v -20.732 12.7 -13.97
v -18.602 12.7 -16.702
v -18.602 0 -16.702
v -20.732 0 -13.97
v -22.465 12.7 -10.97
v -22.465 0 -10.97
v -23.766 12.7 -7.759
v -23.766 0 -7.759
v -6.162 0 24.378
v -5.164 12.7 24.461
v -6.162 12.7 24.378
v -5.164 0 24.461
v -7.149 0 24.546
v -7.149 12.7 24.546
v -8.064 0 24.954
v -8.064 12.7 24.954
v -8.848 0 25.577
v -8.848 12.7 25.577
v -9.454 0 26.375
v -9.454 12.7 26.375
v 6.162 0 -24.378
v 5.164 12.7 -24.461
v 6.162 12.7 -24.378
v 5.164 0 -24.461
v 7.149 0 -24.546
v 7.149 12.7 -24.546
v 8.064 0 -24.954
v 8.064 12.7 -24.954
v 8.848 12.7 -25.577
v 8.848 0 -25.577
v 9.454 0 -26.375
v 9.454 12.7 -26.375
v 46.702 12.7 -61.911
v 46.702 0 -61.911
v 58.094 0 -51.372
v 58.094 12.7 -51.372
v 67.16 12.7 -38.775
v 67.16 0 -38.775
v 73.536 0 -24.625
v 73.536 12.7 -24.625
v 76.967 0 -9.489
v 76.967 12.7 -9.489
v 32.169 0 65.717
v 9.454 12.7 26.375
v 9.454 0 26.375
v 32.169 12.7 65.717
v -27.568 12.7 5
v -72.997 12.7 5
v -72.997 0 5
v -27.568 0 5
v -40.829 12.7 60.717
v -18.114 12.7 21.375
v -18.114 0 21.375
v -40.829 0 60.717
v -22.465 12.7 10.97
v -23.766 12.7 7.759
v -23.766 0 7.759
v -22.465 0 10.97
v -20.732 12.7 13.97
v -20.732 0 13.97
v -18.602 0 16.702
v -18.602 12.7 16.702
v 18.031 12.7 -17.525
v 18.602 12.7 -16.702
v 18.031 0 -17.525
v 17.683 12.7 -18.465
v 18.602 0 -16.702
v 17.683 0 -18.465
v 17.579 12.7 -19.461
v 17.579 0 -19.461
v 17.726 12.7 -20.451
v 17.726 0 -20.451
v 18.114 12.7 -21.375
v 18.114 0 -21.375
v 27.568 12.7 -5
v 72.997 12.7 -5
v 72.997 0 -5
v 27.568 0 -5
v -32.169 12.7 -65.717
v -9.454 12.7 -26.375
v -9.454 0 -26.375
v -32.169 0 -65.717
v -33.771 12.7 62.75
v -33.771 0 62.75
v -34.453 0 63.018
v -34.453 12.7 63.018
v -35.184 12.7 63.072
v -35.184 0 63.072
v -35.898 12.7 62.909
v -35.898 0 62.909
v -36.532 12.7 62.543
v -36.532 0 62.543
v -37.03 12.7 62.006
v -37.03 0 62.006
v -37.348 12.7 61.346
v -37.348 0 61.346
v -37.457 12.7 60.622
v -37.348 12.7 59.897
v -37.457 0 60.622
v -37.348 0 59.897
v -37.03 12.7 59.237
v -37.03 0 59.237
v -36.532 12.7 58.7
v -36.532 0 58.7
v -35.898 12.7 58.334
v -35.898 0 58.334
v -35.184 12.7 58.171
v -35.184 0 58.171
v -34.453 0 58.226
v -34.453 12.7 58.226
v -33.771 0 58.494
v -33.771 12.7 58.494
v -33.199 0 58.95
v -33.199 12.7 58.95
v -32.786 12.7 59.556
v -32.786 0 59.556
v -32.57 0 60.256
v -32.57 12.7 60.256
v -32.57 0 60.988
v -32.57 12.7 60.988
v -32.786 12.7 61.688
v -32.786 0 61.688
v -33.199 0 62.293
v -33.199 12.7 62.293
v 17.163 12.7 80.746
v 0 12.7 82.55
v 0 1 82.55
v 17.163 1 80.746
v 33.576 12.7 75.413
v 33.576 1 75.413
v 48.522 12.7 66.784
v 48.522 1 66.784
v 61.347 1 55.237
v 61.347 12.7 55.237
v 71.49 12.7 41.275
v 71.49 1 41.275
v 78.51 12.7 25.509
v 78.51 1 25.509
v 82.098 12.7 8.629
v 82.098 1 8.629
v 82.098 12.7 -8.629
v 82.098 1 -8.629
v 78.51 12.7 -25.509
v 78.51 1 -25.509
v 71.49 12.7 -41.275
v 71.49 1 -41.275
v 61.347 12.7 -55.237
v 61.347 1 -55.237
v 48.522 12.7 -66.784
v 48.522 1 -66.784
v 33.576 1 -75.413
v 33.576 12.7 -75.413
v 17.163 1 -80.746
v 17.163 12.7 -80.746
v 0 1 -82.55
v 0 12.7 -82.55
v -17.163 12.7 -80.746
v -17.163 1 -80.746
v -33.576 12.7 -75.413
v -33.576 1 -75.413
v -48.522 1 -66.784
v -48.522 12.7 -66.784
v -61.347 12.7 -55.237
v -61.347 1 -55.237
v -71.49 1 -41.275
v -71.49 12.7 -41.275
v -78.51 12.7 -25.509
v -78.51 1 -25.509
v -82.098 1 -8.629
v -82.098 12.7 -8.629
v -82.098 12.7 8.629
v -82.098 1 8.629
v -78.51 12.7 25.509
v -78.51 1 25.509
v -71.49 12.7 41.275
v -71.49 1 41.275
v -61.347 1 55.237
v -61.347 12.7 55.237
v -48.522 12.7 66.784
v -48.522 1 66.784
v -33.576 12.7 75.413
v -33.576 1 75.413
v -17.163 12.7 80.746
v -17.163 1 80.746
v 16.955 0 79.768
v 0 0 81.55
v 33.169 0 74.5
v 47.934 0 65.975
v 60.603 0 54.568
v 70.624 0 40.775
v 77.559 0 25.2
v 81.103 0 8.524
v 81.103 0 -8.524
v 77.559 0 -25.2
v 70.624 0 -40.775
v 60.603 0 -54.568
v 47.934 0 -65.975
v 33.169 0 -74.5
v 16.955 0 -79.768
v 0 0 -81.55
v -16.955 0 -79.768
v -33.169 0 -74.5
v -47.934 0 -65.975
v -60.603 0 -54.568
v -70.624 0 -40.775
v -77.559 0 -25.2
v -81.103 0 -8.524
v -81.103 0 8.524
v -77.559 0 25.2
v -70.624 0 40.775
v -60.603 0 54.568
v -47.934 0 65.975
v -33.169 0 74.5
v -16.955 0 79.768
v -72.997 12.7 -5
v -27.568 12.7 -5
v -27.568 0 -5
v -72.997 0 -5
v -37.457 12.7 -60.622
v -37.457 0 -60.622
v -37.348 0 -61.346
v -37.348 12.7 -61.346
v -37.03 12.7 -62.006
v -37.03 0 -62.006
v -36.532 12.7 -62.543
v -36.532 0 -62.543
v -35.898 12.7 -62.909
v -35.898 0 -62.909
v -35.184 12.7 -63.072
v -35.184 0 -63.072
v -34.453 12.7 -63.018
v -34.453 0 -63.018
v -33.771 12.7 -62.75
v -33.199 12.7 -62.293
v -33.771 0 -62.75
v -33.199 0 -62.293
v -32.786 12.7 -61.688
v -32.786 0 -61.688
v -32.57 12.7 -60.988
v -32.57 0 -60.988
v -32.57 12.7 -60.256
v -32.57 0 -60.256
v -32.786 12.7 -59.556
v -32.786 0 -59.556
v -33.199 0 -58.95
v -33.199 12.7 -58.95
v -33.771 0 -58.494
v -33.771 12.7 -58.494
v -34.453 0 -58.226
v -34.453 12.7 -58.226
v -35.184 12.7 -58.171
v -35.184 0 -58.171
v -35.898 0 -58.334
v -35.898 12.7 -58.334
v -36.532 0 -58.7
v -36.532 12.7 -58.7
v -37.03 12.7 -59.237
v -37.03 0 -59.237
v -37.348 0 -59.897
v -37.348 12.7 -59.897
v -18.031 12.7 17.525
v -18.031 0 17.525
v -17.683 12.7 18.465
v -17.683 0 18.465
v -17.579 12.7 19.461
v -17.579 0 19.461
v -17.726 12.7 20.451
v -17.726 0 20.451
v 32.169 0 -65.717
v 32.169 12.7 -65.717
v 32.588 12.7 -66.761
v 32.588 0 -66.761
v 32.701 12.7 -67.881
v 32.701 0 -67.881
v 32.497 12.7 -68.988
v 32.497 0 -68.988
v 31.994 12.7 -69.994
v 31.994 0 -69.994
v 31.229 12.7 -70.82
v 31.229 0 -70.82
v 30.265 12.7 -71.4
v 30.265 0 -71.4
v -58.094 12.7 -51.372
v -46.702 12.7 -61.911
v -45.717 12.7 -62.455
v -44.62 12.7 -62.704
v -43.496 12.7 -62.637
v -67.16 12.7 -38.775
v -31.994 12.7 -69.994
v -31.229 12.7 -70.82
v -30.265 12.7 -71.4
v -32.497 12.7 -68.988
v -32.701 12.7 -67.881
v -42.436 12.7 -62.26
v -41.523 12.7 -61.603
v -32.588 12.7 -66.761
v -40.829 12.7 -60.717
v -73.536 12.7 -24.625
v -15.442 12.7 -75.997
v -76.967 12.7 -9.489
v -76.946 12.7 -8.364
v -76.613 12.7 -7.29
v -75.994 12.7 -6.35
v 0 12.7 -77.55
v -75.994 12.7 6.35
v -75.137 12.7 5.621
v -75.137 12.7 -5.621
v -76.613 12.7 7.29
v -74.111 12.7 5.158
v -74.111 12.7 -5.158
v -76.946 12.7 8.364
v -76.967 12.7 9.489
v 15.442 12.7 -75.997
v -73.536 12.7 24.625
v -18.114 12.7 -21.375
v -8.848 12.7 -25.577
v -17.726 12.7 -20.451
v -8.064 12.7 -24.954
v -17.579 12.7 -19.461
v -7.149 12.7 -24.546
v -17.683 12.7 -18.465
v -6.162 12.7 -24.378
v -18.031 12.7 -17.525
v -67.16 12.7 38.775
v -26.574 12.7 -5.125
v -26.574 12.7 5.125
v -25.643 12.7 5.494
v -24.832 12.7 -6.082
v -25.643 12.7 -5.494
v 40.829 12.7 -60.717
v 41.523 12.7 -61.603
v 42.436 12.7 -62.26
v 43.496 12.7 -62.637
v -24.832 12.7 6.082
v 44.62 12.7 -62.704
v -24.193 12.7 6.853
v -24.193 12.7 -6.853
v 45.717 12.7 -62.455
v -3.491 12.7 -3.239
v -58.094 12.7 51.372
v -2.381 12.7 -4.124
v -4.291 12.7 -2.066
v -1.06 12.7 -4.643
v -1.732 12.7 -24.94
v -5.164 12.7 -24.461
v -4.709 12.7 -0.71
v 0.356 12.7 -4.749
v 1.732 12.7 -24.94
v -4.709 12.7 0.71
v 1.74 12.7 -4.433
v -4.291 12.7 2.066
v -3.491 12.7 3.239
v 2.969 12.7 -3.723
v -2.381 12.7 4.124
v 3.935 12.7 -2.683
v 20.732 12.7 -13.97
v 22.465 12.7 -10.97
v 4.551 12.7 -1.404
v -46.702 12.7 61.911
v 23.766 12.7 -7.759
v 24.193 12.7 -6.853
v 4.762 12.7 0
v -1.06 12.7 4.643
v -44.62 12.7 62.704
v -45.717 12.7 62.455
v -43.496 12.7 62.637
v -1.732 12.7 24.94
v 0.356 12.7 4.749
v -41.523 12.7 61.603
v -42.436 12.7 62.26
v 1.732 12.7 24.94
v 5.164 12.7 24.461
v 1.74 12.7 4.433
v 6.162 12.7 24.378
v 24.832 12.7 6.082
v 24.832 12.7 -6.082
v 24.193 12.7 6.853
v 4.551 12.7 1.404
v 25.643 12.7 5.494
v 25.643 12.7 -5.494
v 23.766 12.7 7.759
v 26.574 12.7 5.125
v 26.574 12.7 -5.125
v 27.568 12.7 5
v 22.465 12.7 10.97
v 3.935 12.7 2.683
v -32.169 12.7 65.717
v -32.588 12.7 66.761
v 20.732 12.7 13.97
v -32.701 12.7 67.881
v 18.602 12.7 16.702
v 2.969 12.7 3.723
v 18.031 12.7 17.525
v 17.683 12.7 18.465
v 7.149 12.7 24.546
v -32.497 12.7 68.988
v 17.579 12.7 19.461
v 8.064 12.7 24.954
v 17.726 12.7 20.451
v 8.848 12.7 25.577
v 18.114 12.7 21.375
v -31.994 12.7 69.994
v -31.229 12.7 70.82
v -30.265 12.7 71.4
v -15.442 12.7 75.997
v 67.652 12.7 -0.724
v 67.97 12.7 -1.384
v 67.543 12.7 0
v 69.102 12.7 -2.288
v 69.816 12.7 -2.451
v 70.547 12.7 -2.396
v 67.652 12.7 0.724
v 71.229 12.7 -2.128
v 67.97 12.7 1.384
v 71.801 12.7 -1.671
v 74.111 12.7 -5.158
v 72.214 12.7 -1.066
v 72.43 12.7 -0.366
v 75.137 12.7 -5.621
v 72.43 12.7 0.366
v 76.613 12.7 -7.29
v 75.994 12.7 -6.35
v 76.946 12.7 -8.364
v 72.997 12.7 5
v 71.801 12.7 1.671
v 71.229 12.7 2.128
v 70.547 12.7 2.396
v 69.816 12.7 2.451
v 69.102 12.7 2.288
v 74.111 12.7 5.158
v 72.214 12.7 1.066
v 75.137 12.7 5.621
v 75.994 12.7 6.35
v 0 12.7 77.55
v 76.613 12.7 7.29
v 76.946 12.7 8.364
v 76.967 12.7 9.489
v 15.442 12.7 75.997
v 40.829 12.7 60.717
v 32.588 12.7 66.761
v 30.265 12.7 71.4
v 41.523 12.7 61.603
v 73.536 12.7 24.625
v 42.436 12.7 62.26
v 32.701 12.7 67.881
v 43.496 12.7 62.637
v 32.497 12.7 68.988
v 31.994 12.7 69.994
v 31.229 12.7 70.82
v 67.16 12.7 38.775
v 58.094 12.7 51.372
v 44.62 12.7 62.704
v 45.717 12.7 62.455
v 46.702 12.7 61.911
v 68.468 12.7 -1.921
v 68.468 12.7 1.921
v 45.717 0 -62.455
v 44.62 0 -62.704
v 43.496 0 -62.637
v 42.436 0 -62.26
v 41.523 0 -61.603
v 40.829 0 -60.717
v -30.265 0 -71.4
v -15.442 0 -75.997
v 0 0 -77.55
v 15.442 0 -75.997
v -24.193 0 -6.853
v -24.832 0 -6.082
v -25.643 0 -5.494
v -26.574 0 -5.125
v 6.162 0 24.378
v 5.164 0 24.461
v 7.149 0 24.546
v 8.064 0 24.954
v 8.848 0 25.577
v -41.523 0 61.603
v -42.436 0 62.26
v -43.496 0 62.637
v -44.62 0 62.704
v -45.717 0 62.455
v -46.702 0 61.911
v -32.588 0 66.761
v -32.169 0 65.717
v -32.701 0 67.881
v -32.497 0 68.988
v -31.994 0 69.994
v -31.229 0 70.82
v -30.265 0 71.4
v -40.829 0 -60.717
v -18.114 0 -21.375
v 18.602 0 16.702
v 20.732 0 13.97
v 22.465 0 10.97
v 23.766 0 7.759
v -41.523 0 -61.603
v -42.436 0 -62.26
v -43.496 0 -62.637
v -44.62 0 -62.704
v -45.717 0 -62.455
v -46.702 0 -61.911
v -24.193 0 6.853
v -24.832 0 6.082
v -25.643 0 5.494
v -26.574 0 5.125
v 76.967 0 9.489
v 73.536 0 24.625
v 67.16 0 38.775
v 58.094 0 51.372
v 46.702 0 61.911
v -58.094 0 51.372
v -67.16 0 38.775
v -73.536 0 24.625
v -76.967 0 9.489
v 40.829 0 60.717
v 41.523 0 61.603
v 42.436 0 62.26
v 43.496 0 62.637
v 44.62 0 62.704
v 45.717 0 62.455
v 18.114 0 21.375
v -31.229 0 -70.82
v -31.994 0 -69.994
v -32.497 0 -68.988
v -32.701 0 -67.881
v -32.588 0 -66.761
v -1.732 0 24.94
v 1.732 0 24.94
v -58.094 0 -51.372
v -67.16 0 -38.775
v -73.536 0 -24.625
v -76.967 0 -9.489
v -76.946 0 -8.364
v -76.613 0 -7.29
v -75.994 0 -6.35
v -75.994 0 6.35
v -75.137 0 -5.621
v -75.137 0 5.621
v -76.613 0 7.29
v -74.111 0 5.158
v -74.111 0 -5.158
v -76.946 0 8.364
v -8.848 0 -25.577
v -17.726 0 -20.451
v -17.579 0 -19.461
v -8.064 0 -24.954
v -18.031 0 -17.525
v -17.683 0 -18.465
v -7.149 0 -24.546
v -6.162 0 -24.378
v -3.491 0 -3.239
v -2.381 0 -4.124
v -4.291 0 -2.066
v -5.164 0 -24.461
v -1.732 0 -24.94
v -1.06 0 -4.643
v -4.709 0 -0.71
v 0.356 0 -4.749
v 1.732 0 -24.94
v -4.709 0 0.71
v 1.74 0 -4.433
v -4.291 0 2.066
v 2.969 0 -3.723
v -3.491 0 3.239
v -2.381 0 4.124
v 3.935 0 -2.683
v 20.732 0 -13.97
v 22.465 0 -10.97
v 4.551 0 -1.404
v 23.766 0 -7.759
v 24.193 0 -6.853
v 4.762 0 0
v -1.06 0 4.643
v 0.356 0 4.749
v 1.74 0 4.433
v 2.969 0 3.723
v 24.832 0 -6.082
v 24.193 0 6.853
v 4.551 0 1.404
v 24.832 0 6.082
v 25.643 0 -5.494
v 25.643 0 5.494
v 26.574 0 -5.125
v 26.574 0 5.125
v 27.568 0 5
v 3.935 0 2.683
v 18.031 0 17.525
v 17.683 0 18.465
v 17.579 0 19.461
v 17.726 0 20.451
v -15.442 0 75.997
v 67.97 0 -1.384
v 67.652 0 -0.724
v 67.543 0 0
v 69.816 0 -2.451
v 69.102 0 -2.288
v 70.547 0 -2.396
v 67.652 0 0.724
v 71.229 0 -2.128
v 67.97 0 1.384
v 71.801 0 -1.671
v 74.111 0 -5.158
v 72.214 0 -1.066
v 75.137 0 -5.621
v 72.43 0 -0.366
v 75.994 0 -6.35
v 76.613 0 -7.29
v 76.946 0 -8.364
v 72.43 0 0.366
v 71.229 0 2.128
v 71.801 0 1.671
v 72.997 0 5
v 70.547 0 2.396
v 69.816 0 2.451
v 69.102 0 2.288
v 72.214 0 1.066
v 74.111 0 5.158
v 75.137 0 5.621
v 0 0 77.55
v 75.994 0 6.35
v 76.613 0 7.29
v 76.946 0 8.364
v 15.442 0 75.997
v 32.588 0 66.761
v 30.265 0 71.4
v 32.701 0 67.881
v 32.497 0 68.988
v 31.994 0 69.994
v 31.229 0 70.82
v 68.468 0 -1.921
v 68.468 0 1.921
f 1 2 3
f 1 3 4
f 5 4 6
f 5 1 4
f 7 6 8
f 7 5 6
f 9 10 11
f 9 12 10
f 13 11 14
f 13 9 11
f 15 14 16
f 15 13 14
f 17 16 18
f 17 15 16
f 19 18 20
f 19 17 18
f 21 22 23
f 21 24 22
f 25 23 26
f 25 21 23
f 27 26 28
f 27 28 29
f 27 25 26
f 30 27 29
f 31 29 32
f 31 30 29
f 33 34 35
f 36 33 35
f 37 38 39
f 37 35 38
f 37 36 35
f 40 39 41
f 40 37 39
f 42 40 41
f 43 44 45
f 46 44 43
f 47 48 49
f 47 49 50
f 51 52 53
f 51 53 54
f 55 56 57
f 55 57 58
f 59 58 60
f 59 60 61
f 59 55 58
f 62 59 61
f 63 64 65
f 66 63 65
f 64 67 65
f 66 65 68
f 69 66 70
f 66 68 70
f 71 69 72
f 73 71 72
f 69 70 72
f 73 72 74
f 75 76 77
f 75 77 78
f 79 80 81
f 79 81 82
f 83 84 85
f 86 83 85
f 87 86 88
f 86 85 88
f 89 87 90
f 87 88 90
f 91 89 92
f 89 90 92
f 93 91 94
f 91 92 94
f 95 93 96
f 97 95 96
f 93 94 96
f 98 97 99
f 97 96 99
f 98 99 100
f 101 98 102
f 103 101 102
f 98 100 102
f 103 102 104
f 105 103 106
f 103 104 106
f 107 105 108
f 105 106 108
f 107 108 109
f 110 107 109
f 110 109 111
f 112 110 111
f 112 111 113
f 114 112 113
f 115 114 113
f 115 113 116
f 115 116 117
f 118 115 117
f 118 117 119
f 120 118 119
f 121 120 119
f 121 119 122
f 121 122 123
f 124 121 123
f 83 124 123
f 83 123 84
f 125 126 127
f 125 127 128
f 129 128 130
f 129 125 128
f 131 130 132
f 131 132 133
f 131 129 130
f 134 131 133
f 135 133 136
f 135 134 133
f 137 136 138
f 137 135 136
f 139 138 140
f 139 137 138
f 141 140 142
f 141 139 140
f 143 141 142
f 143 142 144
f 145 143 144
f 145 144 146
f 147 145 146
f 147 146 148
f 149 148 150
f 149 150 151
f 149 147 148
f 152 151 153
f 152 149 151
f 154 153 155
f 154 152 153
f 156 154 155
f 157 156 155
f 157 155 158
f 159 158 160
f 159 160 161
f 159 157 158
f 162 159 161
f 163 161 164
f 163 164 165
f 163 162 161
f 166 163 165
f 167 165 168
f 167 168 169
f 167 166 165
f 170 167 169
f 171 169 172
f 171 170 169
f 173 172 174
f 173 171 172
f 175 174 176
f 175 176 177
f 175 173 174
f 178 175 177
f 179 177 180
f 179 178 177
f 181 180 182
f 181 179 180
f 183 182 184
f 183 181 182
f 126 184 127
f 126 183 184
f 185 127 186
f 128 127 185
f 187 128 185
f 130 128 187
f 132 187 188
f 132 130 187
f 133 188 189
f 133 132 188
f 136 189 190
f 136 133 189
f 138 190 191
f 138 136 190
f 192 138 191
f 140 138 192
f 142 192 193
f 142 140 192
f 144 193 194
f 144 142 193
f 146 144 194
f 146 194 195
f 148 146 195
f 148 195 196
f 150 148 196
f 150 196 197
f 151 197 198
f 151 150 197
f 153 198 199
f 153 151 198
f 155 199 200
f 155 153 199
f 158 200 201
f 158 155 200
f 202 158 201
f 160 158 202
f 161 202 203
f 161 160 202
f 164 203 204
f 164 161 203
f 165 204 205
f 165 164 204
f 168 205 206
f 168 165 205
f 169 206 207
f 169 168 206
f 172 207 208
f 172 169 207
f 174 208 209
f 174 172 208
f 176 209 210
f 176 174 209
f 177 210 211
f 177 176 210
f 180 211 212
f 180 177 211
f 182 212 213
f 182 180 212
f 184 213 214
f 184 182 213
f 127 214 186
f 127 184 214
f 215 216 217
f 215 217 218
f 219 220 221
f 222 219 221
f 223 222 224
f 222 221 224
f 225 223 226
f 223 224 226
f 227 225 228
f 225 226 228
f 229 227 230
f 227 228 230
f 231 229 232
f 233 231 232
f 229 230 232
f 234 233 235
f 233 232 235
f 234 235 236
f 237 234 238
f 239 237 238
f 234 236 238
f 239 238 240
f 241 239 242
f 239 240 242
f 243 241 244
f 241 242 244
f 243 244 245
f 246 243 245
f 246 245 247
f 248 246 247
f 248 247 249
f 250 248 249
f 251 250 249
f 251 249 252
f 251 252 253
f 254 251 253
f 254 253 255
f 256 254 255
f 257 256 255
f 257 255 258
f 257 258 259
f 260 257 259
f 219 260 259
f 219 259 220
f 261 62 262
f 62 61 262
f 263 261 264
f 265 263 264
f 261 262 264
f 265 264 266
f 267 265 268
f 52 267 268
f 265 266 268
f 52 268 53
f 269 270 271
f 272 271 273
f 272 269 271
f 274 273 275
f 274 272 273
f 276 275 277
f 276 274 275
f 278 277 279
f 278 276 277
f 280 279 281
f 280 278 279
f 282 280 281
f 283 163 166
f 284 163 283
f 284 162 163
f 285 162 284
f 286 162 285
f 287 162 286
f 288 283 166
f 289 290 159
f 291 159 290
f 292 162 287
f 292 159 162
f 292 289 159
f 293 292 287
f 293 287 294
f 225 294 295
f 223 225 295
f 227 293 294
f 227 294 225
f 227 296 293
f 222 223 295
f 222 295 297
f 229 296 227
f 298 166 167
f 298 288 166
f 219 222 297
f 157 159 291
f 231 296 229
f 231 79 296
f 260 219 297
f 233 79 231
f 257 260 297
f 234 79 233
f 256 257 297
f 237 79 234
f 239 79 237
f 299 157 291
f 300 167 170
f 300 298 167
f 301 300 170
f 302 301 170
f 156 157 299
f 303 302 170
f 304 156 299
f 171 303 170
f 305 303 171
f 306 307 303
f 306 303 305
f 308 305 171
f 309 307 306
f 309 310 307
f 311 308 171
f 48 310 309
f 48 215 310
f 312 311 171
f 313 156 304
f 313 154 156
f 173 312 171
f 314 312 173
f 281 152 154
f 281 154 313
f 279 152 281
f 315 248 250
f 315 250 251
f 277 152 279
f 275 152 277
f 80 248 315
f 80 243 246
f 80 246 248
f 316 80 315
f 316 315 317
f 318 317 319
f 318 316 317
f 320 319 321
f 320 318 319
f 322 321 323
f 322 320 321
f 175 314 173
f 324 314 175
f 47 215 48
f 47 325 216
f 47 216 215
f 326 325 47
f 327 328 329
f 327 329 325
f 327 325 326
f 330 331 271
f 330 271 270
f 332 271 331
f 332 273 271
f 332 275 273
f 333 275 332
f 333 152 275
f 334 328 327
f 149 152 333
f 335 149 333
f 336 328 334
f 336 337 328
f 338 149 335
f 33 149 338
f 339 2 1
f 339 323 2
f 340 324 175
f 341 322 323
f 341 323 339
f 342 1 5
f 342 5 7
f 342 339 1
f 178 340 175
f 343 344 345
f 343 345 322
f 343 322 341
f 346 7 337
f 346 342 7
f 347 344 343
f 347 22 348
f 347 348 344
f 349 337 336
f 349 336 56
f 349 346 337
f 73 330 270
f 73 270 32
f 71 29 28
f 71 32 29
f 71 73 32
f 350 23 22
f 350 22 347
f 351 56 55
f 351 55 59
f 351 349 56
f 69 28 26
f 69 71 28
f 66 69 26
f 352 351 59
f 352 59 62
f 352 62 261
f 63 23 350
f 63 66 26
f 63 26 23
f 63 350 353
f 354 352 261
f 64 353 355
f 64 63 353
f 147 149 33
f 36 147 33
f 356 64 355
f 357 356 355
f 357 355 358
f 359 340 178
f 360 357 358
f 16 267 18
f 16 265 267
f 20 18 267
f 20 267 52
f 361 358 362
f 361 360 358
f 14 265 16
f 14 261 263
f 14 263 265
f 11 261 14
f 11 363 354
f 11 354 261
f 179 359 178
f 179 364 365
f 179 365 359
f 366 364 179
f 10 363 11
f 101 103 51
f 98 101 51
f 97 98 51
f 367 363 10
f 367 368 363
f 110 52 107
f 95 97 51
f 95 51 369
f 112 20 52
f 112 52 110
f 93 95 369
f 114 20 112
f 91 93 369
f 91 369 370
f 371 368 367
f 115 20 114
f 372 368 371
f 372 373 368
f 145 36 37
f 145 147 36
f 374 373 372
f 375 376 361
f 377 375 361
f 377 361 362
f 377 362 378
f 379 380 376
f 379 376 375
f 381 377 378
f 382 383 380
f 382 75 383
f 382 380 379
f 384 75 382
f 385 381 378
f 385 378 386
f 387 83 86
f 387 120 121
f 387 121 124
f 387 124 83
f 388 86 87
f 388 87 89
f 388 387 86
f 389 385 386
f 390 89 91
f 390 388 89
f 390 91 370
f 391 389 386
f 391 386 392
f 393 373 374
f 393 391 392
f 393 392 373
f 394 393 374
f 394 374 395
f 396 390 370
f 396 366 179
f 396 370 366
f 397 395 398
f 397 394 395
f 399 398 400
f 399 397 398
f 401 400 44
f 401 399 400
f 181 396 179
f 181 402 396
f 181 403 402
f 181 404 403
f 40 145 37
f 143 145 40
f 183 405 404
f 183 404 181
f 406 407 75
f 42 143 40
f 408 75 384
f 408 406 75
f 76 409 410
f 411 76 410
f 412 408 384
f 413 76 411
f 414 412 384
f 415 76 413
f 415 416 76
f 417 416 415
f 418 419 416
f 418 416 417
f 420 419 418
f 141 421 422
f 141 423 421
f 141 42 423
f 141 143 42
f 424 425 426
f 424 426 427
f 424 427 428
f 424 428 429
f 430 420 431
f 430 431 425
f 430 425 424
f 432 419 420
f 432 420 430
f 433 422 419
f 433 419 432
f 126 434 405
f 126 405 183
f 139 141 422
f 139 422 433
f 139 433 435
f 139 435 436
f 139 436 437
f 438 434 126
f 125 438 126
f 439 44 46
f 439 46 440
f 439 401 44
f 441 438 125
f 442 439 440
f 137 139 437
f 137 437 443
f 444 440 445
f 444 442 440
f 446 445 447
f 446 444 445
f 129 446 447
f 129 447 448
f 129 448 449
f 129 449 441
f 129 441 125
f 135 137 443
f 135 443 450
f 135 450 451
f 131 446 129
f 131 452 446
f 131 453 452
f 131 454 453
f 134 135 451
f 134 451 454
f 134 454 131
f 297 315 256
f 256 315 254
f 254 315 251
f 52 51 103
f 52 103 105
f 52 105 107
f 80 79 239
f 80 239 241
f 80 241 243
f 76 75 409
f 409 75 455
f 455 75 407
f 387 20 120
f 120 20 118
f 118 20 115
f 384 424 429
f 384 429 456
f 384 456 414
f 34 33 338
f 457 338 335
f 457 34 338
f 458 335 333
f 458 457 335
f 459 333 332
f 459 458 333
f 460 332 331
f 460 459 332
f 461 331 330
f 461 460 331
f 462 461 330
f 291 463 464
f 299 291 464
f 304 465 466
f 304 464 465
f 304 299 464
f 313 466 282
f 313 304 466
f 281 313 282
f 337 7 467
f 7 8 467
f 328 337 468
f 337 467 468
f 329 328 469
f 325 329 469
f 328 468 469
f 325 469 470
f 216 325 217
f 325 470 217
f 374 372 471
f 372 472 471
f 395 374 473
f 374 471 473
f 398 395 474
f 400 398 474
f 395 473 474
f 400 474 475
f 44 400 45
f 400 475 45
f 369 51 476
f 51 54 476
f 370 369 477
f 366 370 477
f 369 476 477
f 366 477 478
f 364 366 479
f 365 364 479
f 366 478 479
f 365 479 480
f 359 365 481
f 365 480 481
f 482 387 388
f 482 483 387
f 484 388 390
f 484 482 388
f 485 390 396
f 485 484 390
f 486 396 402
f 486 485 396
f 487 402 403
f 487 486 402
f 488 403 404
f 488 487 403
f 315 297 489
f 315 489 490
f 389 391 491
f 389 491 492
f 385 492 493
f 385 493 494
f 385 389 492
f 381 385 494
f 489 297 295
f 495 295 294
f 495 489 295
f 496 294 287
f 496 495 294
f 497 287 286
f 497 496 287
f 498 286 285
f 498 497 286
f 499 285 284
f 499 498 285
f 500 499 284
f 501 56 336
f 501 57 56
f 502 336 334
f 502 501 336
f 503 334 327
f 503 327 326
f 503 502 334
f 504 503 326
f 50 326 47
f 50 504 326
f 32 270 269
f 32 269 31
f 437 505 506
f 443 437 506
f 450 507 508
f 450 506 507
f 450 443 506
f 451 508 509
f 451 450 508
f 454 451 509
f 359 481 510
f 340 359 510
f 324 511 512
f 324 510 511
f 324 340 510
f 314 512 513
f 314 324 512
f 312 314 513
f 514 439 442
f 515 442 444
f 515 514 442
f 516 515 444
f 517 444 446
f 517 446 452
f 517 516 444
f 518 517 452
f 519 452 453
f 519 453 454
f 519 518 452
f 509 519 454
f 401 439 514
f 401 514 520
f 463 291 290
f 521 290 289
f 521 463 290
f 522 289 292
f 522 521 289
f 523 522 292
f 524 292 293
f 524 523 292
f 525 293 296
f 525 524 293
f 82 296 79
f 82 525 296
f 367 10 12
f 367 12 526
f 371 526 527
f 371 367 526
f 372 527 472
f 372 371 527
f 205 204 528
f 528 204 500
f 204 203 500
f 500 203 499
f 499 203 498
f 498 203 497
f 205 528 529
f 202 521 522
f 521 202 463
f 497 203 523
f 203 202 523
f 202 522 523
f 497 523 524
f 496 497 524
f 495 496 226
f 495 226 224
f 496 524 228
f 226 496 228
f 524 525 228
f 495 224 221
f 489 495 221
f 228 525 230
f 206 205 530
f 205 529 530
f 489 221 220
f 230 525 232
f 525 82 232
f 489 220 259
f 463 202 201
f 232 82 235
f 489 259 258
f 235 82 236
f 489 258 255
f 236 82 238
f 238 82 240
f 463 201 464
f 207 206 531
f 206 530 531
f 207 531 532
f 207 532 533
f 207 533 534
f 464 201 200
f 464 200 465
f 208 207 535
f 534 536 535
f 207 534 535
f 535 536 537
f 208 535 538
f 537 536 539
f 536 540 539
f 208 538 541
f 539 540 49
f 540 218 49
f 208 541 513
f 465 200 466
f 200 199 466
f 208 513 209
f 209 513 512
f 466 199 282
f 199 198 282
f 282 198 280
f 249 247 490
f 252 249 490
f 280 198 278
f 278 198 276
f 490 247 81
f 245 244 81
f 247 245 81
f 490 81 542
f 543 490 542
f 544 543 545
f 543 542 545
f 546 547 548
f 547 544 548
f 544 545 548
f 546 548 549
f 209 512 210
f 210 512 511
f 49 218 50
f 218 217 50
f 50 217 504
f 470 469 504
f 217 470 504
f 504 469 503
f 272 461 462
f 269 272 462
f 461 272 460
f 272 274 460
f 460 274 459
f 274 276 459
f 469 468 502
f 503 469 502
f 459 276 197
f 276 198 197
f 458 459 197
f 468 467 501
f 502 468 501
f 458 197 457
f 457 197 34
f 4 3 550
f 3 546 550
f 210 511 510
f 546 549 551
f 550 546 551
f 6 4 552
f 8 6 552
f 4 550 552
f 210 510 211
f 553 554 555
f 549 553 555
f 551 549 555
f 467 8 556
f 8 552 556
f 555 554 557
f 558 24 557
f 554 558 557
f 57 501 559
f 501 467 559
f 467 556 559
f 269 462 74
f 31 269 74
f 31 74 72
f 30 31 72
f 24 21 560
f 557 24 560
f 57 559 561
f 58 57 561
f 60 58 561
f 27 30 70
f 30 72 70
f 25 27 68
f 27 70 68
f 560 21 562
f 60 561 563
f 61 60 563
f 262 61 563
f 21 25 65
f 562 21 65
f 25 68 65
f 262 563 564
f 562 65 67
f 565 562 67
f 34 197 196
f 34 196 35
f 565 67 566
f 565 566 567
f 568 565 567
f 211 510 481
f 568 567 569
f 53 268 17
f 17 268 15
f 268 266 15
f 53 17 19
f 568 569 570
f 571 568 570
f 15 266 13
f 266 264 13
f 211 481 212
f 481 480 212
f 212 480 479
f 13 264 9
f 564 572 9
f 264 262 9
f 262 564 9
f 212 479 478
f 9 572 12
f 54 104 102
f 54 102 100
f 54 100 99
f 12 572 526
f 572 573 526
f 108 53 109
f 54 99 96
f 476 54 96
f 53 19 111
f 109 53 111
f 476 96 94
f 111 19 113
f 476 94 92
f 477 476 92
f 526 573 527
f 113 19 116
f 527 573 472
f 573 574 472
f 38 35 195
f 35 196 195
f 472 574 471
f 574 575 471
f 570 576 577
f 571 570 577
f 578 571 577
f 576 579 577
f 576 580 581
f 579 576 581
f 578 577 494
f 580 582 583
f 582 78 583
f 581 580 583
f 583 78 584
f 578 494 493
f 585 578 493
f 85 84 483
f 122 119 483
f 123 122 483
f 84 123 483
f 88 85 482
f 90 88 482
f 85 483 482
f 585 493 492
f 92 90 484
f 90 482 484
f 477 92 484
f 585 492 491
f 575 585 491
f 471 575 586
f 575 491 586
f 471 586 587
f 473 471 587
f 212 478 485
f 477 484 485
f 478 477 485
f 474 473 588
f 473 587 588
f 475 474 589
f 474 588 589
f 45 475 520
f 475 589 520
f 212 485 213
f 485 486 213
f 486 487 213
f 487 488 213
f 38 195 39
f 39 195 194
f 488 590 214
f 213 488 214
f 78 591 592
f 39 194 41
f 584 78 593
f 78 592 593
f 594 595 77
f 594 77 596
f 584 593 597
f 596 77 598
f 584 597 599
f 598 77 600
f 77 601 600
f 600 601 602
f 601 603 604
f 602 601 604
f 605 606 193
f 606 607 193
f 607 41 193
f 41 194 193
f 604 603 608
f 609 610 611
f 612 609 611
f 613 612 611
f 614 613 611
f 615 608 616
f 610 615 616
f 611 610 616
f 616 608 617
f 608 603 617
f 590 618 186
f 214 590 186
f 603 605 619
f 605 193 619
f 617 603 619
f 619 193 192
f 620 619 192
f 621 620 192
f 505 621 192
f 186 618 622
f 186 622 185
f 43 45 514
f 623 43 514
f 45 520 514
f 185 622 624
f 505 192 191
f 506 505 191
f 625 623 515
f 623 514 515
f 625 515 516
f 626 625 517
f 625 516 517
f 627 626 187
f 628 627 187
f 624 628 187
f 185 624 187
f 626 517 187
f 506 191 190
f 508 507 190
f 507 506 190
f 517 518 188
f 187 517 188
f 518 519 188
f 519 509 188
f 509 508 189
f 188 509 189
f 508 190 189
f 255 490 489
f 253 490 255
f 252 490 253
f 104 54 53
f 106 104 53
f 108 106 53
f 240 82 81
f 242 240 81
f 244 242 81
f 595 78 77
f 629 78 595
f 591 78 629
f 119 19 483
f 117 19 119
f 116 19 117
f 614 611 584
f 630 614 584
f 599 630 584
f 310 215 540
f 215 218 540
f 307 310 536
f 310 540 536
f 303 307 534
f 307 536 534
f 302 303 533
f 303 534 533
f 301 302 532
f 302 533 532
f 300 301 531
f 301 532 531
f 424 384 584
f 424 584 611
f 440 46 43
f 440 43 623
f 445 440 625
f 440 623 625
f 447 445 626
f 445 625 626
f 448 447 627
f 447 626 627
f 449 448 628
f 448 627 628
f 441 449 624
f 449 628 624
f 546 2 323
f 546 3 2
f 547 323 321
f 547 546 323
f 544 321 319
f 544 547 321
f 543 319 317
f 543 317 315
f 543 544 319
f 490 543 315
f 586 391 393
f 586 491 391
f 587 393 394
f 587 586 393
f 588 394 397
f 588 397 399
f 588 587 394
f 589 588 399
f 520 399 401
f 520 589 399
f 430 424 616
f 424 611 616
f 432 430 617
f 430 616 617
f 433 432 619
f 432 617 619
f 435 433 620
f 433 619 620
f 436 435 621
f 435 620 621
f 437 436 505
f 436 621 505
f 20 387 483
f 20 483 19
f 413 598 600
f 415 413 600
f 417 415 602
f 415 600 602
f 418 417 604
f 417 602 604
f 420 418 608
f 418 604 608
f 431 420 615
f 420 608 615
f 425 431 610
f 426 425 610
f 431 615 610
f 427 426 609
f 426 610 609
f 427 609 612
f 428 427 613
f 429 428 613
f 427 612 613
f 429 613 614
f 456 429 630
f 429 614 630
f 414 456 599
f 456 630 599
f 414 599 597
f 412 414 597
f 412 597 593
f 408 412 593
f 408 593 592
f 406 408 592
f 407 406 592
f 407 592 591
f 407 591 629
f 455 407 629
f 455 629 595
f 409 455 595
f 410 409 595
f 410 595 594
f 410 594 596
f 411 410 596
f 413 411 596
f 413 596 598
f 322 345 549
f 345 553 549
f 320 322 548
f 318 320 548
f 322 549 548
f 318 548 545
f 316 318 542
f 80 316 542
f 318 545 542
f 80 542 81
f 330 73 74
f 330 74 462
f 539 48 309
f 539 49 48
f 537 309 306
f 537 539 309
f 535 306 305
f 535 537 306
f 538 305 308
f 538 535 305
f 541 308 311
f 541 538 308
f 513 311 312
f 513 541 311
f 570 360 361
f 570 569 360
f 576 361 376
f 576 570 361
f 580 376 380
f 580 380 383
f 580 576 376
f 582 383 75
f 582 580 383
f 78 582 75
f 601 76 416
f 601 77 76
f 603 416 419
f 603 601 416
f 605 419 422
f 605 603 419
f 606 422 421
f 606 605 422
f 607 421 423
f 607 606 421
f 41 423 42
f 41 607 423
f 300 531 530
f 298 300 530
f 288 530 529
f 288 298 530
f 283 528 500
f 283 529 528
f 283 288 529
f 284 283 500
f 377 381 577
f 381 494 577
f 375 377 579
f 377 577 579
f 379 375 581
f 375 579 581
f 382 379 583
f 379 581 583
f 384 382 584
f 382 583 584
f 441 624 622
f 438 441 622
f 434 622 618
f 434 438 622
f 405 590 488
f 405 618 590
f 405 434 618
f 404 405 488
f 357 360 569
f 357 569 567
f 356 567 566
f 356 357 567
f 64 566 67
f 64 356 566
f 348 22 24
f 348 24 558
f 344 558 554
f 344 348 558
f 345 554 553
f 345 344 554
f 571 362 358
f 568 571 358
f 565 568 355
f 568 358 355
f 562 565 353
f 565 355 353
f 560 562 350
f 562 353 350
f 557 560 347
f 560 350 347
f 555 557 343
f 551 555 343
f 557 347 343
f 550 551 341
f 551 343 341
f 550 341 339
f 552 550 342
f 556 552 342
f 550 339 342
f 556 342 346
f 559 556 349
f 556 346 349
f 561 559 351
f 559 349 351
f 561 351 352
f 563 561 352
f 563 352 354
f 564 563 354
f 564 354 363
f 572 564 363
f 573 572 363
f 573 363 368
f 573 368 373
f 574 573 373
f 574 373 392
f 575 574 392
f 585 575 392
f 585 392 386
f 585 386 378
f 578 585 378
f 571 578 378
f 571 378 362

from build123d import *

# Parameters (mm, degrees)
SKETCH2_W                    = 82.55
SKETCH2_H                    = 12.7
F_10_0_1935_DIAMETER_HOLE1_D = 4.9149
CIRPATTERN3_COUNT            = 3
CUT_EXTRUDE1_DEPTH           = 13.7
FILLET1_R                    = 4
CIRPATTERN4_COUNT            = 6
FILLET1_OF_CIRPATTERN4_R     = 4
CHAMFER2_SIZE                = 1
F_3_8_0_375_DIAMETER_HOLE1_D = 9.525


with BuildPart() as part:
    # Sketch2 → Revolve1 (revolve)
    with BuildSketch(Plane(origin=(0, 0, 0), x_dir=(0, 0, -1), z_dir=(1, 0, 0))):
        with Locations((-41.275, 6.35)):
            Rectangle(SKETCH2_W, SKETCH2_H)
    revolve(axis=Axis((0, -0.635, 0), (0, 1, 0)))

    # #10 (0.1935) Diameter Hole1 (through all)
    with Locations(Plane(origin=(0, 12.7, 0), x_dir=(1, 0, 0), z_dir=(0, 1, 0))):
        with Locations((-35, 60.621778)):
            f_10_0_1935_diameter_hole1 = Hole(F_10_0_1935_DIAMETER_HOLE1_D / 2)

    # CirPattern3: #10 (0.1935) Diameter Hole1 ×3 about axis
    cirpattern3_axis = Axis((0, 0, 0), (0, 1, 0))
    for i in range(1, CIRPATTERN3_COUNT):
        add(f_10_0_1935_diameter_hole1.rotate(cirpattern3_axis, i * 360 / CIRPATTERN3_COUNT), mode=Mode.SUBTRACT)

    # Sketch8 → Cut-Extrude1 (cut, through all)
    with BuildSketch(Plane(origin=(0, 12.7, 0), x_dir=(1, 0, 0), z_dir=(0, 1, 0))):
        with BuildLine():
            Line((-7.917322, 23.713203), (-34.364196, 69.520533))
            ThreePointArc((-34.364196, 69.520533), (0, 77.55), (34.364196, 69.520533))
            Line((34.364196, 69.520533), (7.917322, 23.713203))
            ThreePointArc((7.917322, 23.713203), (0, 25), (-7.917322, 23.713203))
        make_face()
    cut_extrude1 = extrude(amount=-CUT_EXTRUDE1_DEPTH, mode=Mode.SUBTRACT)

    # Fillet1
    fillet1_edges = [part.edges().sort_by_distance(p)[0] for p in [
        (7.917322, 6.35, -23.713203),
        (-7.917322, 6.35, -23.713203),
        (-34.364196, 6.35, -69.520533),
        (34.364196, 6.35, -69.520533),
    ]]
    fillet(fillet1_edges, radius=FILLET1_R)

    # CirPattern4: Cut-Extrude1 ×6 about axis
    cirpattern4_axis = Axis((0, 0, 0), (0, 1, 0))
    for i in range(1, CIRPATTERN4_COUNT):
        add(cut_extrude1.rotate(cirpattern4_axis, i * 360 / CIRPATTERN4_COUNT), mode=Mode.SUBTRACT)

    # Fillet1 of CirPattern4
    fillet1_of_cirpattern4_edges = [part.edges().sort_by_distance(p)[0] for p in [
        (-16.577576, 6.35, -18.713203),
        (-24.494897, 6.35, -5),
        (-77.388646, 6.35, -5),
        (-43.02445, 6.35, -64.520533),
        (-24.494897, 6.35, 5),
        (-16.577576, 6.35, 18.713203),
        (-43.02445, 6.35, 64.520533),
        (-77.388646, 6.35, 5),
        (-7.917322, 6.35, 23.713203),
        (7.917322, 6.35, 23.713203),
        (34.364196, 6.35, 69.520533),
        (-34.364196, 6.35, 69.520533),
        (16.577576, 6.35, 18.713203),
        (24.494897, 6.35, 5),
        (77.388646, 6.35, 5),
        (43.02445, 6.35, 64.520533),
        (24.494897, 6.35, -5),
        (16.577576, 6.35, -18.713203),
        (43.02445, 6.35, -64.520533),
        (77.388646, 6.35, -5),
    ]]
    fillet(fillet1_of_cirpattern4_edges, radius=FILLET1_OF_CIRPATTERN4_R)

    # Chamfer2
    chamfer2_edges = [part.edges().sort_by_distance(p)[0] for p in [
        (0, 0, -82.55),
    ]]
    chamfer(chamfer2_edges, length=CHAMFER2_SIZE)

    # 3/8 (0.375) Diameter Hole1 (through all)
    with Locations(Plane(origin=(0, 0, 0), x_dir=(-1, 0, 0), z_dir=(0, -1, 0))):
        with Locations((0, 0)):
            Hole(F_3_8_0_375_DIAMETER_HOLE1_D / 2)


solid = part.part
